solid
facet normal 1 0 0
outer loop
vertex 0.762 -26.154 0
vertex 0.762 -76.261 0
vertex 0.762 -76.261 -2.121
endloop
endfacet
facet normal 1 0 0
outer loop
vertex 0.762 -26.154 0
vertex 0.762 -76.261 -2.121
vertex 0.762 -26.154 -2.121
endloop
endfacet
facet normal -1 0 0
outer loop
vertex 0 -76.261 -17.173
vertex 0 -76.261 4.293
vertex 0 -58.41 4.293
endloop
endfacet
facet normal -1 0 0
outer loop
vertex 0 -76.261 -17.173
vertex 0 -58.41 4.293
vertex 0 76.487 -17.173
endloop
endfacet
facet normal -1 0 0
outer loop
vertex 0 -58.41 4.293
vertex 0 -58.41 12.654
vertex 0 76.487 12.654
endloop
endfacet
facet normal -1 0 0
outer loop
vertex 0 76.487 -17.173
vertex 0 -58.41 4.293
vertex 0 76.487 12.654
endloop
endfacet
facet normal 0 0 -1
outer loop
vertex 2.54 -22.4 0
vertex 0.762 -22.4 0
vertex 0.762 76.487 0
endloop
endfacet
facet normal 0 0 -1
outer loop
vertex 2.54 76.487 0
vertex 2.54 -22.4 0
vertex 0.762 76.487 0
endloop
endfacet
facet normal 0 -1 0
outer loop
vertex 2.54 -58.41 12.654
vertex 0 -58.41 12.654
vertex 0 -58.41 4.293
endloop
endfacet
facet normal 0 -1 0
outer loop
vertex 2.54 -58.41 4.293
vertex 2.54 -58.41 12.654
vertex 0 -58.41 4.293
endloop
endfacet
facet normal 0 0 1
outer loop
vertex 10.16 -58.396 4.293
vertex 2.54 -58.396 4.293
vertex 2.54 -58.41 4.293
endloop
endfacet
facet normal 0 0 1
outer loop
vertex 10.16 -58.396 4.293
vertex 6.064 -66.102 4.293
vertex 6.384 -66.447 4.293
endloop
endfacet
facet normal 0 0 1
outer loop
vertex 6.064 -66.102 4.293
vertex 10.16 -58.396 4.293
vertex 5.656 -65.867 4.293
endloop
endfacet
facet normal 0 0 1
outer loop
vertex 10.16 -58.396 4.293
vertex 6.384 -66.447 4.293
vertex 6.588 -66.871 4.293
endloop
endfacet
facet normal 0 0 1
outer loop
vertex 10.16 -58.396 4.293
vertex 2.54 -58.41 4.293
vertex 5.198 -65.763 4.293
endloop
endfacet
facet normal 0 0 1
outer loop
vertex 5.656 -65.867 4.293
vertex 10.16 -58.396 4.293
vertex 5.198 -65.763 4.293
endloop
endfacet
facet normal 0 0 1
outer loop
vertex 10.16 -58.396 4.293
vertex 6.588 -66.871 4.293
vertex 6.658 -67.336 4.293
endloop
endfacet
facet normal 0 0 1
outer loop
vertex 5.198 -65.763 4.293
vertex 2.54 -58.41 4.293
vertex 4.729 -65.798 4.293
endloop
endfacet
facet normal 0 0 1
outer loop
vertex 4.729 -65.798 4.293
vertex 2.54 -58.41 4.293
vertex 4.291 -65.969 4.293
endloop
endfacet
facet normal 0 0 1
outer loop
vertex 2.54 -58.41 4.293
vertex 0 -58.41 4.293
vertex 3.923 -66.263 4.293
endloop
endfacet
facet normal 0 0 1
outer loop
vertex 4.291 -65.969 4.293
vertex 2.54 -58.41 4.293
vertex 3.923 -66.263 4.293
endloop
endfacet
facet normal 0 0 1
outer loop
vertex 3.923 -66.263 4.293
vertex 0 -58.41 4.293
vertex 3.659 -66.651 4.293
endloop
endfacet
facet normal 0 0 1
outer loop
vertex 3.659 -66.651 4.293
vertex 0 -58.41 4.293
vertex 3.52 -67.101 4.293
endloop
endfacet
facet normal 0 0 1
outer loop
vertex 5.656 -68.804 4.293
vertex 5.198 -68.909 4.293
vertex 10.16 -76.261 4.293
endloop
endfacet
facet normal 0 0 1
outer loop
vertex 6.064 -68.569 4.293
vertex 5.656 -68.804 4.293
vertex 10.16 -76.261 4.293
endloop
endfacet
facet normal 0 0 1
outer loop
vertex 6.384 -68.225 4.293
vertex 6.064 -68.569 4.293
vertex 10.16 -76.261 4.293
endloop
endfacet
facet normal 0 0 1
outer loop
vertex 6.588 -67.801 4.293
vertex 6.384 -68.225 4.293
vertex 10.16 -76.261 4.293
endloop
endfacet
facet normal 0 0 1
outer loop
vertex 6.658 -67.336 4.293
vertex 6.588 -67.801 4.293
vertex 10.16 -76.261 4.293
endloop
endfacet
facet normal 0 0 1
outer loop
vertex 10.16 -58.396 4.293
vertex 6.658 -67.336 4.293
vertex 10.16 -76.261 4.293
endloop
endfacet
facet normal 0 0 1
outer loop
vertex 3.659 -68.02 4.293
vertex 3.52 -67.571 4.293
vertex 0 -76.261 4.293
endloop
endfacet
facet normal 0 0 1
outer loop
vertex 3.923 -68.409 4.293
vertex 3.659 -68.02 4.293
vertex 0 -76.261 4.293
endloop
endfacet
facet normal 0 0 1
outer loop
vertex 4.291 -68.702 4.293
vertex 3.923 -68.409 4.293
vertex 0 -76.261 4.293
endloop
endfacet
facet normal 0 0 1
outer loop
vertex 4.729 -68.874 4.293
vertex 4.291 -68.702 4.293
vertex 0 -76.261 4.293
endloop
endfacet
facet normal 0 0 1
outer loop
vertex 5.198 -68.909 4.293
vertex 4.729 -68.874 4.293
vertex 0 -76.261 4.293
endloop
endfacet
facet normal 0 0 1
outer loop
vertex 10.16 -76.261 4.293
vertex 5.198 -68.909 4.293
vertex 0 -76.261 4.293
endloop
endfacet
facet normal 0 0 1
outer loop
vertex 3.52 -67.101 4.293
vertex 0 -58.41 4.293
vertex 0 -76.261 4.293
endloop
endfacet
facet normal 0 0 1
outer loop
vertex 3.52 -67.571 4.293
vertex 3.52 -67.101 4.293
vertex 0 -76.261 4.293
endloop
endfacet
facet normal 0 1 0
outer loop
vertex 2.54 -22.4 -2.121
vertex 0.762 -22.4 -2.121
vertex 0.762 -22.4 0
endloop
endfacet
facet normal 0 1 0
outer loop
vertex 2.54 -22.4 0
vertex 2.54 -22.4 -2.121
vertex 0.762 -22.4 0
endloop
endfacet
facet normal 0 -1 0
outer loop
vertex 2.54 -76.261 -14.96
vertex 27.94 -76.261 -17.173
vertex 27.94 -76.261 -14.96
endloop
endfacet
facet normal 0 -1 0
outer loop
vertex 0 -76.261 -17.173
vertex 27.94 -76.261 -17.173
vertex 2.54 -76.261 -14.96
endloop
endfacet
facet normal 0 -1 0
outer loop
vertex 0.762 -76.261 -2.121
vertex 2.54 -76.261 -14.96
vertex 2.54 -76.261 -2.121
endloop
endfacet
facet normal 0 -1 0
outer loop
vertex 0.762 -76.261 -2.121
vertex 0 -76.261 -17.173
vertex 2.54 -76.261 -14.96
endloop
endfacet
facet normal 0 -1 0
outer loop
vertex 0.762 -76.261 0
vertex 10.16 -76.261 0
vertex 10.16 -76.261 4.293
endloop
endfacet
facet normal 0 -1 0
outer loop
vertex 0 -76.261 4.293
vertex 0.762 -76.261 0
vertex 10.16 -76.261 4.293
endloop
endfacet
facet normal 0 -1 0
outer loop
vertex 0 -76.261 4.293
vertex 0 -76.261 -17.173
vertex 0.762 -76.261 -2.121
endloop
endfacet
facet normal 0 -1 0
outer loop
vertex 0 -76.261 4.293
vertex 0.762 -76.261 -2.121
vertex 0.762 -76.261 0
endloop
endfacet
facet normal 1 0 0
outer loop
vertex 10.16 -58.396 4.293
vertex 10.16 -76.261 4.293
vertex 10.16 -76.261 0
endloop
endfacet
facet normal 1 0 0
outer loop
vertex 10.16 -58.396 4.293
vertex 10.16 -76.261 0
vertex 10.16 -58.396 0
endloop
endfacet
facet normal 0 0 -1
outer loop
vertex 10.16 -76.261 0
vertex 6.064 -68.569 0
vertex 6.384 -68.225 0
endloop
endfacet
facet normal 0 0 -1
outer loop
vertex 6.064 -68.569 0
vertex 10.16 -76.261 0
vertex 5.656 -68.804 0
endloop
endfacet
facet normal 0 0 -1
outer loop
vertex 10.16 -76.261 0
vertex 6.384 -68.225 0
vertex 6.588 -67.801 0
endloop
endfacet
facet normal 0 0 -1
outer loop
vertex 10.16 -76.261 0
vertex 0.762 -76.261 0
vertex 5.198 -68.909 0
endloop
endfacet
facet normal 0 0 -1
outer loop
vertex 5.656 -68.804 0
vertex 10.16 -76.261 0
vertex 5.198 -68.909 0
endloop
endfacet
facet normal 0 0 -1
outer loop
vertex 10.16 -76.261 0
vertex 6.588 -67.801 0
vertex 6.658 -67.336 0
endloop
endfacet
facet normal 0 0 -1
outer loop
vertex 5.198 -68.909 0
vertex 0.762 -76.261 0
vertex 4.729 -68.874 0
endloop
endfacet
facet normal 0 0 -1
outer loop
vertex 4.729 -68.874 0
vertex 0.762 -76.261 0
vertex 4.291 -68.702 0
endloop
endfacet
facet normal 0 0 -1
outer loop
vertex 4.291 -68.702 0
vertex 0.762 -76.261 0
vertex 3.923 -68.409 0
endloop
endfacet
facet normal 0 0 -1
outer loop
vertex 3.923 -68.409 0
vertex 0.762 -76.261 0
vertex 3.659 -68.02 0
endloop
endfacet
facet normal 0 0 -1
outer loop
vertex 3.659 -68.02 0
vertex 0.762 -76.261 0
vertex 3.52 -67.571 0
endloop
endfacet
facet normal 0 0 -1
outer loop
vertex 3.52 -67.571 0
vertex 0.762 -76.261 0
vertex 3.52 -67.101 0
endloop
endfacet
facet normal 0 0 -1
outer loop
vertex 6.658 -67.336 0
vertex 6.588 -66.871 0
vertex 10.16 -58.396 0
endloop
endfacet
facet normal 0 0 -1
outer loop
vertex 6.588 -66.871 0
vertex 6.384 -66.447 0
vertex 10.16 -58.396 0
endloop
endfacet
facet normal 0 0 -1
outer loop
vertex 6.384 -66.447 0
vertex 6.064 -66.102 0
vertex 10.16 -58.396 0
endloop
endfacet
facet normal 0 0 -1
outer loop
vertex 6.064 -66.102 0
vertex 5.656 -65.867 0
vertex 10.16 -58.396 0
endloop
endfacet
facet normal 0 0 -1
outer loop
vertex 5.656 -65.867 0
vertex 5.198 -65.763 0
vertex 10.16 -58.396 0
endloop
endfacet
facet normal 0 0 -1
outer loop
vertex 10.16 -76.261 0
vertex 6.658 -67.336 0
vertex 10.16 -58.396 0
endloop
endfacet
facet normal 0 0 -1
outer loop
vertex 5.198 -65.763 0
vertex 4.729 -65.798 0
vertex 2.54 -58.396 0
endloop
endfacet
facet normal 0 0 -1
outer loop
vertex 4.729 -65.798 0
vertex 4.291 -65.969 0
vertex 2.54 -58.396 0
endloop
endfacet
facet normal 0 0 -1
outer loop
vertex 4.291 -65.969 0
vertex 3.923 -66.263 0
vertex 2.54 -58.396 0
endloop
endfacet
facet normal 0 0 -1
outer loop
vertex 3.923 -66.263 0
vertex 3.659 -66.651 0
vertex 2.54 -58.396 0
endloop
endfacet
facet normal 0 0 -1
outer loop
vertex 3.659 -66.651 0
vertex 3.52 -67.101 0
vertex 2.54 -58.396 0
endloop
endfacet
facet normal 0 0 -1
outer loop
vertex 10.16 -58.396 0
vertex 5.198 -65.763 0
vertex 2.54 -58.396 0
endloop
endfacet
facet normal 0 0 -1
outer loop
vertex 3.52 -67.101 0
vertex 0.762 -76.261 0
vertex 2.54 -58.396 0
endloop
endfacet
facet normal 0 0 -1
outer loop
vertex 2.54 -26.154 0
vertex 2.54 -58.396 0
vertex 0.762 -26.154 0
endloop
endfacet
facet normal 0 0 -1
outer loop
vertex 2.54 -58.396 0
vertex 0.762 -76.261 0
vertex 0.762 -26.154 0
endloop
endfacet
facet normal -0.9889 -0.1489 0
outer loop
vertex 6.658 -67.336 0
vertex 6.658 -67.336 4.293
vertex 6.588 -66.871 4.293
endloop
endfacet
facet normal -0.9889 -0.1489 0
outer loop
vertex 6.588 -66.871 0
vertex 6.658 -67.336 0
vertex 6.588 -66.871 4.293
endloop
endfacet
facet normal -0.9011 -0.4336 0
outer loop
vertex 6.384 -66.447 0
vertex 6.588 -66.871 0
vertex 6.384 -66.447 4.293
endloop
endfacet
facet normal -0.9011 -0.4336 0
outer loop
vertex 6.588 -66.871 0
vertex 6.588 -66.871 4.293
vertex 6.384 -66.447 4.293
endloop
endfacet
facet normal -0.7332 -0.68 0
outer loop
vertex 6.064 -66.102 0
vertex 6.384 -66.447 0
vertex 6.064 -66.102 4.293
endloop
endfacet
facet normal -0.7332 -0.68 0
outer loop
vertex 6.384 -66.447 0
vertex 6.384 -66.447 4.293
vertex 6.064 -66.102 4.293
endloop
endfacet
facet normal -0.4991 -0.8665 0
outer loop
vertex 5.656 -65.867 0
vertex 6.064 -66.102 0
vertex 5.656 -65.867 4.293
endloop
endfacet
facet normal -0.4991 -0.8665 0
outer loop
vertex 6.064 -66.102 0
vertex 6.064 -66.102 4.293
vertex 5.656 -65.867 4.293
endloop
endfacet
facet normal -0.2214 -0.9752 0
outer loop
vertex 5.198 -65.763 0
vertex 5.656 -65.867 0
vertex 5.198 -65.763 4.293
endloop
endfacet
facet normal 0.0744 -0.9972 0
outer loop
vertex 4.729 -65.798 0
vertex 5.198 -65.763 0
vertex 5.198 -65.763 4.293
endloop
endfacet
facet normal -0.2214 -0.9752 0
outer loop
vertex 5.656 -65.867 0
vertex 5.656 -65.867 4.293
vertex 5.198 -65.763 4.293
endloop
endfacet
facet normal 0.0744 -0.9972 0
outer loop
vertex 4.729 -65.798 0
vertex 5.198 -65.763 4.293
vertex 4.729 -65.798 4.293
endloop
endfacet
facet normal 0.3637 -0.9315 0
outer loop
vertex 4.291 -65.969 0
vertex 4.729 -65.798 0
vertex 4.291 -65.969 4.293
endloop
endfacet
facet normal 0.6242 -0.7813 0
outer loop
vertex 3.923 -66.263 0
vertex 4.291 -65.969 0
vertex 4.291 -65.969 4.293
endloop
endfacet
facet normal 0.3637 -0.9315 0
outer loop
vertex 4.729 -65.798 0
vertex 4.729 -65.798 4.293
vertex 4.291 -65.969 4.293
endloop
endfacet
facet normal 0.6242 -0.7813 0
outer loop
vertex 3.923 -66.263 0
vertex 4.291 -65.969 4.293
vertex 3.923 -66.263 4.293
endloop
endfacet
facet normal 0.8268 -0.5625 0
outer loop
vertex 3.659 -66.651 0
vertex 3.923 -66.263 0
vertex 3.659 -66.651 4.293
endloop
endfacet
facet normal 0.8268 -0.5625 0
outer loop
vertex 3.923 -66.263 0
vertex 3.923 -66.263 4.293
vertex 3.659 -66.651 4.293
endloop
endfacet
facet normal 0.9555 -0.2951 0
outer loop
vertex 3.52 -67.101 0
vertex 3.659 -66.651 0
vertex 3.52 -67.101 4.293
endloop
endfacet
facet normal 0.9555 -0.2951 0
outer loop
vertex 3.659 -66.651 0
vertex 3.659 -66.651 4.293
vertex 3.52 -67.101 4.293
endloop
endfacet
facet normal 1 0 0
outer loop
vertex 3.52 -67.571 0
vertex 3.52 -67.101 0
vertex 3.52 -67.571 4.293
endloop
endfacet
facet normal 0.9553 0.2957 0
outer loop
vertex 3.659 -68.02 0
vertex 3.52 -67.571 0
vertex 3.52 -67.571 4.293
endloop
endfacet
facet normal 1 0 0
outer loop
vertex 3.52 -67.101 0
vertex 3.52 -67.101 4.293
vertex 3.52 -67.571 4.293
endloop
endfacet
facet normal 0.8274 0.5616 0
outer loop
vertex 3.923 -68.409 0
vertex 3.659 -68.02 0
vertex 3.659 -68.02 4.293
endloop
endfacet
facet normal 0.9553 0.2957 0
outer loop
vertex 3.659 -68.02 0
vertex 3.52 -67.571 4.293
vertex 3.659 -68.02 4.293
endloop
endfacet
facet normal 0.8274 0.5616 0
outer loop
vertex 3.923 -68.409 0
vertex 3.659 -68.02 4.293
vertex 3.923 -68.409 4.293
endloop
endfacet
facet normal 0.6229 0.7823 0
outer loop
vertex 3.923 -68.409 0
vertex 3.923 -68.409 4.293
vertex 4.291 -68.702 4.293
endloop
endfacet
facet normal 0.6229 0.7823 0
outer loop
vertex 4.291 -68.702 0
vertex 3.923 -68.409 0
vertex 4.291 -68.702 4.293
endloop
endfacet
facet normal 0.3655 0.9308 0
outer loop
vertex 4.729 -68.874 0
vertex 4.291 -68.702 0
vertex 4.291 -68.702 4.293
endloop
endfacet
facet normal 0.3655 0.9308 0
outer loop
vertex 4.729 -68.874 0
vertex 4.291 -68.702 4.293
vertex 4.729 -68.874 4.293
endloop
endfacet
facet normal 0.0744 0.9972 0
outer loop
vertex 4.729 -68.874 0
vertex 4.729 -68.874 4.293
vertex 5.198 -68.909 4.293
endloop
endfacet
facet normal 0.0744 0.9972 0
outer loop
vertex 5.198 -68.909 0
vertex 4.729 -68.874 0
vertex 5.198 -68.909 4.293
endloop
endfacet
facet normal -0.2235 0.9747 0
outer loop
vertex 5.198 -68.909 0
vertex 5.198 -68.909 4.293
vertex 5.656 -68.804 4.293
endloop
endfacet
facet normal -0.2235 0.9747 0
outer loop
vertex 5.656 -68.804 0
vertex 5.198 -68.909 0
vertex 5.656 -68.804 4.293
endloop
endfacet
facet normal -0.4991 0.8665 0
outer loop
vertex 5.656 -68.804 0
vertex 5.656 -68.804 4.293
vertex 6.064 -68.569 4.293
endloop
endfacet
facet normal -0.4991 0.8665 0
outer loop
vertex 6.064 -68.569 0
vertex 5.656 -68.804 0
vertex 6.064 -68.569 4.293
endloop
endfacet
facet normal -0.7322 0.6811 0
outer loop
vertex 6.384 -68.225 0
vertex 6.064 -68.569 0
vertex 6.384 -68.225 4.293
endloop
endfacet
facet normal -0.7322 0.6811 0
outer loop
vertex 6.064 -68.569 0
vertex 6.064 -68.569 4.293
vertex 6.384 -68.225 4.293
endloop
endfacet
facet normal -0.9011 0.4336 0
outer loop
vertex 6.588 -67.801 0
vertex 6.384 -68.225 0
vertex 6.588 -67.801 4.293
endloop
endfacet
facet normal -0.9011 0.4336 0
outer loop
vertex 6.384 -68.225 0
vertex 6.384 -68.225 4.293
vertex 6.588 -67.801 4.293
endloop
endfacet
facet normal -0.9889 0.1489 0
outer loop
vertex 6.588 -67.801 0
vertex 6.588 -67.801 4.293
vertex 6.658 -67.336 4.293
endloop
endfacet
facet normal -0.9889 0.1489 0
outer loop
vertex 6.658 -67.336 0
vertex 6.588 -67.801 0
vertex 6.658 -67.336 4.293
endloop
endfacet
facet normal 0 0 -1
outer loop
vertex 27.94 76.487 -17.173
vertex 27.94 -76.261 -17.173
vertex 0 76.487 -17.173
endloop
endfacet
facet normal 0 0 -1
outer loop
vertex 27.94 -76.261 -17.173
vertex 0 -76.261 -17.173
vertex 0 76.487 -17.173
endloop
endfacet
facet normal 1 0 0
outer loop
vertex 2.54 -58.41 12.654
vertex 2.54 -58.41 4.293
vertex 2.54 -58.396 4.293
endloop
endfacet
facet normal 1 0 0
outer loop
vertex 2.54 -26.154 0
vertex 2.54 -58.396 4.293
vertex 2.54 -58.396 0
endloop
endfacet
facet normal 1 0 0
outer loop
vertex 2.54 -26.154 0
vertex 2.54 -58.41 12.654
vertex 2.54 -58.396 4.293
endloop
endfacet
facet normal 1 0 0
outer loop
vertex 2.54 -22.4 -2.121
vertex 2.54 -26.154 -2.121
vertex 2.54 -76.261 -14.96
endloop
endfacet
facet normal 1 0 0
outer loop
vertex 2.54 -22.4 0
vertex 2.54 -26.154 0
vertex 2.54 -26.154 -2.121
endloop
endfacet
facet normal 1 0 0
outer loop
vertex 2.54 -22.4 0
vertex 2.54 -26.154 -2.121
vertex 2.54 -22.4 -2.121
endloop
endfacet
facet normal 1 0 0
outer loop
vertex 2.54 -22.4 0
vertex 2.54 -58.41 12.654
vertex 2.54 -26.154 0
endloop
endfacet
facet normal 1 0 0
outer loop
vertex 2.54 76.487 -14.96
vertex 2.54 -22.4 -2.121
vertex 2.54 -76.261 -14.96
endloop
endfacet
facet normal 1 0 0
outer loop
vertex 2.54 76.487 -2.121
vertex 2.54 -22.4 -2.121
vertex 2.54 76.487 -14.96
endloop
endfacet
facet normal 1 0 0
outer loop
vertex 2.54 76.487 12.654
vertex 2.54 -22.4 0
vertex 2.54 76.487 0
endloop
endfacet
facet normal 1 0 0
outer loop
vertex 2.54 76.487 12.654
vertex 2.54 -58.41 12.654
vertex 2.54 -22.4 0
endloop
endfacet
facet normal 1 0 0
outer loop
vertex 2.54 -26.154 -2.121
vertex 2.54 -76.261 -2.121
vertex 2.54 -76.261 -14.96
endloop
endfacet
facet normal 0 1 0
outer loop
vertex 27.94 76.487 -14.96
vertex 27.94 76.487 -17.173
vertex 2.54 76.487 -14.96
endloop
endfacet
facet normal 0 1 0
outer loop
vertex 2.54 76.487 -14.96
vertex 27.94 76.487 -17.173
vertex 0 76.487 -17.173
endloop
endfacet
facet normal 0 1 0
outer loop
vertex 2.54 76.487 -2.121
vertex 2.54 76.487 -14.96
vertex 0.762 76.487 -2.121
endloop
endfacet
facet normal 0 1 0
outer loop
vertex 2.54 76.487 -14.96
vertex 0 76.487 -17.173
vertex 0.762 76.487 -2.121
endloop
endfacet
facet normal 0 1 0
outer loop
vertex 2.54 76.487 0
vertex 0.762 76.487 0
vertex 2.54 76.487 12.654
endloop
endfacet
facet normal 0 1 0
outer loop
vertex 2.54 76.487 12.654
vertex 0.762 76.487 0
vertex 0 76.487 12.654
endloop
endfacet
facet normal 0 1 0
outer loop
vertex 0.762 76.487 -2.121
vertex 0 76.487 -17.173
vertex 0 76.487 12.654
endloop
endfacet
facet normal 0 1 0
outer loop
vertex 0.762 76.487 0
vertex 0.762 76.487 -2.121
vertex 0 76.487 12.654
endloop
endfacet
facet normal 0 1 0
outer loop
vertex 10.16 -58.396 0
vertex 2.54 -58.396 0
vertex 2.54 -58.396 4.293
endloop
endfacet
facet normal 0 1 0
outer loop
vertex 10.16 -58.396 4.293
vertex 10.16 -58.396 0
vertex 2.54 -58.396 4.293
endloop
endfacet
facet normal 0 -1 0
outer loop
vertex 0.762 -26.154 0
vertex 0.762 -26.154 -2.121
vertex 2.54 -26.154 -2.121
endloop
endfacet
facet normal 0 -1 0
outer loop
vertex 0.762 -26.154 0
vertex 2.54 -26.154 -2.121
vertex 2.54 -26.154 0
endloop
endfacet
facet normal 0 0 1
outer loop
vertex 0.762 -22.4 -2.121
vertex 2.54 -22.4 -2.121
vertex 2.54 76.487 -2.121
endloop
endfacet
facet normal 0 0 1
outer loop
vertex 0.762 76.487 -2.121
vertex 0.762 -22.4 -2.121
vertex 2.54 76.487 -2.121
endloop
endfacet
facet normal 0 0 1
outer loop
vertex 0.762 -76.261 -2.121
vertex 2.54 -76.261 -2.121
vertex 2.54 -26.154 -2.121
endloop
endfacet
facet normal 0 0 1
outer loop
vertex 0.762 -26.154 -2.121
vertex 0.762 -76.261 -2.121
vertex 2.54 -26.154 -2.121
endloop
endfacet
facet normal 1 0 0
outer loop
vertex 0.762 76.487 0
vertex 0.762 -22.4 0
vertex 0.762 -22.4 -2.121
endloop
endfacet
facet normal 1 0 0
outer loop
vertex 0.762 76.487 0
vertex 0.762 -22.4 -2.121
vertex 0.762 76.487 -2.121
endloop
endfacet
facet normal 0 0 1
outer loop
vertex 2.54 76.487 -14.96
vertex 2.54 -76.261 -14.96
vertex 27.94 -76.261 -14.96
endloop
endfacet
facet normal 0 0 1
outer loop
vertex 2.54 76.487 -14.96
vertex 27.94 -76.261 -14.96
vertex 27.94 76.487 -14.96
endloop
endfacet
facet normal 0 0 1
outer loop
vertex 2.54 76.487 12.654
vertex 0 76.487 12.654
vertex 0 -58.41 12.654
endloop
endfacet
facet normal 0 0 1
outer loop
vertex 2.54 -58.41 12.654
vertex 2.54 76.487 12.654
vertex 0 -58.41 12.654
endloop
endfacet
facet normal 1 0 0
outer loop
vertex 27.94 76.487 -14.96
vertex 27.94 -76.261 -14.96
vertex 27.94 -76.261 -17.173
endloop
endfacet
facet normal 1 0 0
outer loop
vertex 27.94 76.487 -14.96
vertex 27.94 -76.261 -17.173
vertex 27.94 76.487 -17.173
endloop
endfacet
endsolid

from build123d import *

# Parameters (mm, degrees)
F1_DEPTH  = 2.54
F3_DEPTH  = 7.62
F4_W      = 152.748324
F4_H      = 2.212828
F5_DEPTH  = 25.4
F6_R      = 1.577712
F7_DEPTH  = 4.293219
F8_W      = 152.748324
F8_H      = 2.120568
F9_DEPTH  = 1.778
F10_W     = 3.754646
F10_H     = 2.120568
F11_DEPTH = 1.778


with BuildPart() as f1:
    # F0 (on Right) → F1 (new body)
    with BuildSketch(Plane.YZ):
        Polygon((76.487139, 12.653703), (-58.410417, 12.653703), (-58.410417, 4.293219), (-76.261185, 4.293219), (-76.261185, -17.172892), (76.487139, -17.172892), align=None)
    extrude(amount=F1_DEPTH)

    # F2 (on face) → F3 (join)
    with BuildSketch(Plane.YZ.offset(2.54)):
        Polygon((-58.410417, 4.293219), (-76.261185, 4.293219), (-76.261185, 0), (-58.395639, 0), (-58.395639, 4.293219), align=None)
    extrude(amount=F3_DEPTH)

    # F4 (on face) → F5 (join)
    with BuildSketch(Plane.YZ.offset(2.54)):
        with Locations((0.112977, -16.066478)):
            Rectangle(F4_W, F4_H)
    extrude(amount=F5_DEPTH)

    # F6 (on face) → F7 (cut, through all)
    with BuildSketch(Plane.XY.offset(4.293219)):
        with Locations((5.08, -67.335801)):
            Circle(F6_R)
    extrude(amount=-F7_DEPTH, mode=Mode.SUBTRACT)

    # F8 (on face) → F9 (cut)
    with BuildSketch(Plane.YZ.offset(2.54)):
        with Locations((0.112977, -1.060284)):
            Rectangle(F8_W, F8_H)
    extrude(amount=-F9_DEPTH, mode=Mode.SUBTRACT)

    # F10 (on face) → F11 (join)
    with BuildSketch(Plane.YZ.offset(0.762)):
        with Locations((-24.277054, -1.060284)):
            Rectangle(F10_W, F10_H)
    extrude(amount=F11_DEPTH)


solid = f1.part
